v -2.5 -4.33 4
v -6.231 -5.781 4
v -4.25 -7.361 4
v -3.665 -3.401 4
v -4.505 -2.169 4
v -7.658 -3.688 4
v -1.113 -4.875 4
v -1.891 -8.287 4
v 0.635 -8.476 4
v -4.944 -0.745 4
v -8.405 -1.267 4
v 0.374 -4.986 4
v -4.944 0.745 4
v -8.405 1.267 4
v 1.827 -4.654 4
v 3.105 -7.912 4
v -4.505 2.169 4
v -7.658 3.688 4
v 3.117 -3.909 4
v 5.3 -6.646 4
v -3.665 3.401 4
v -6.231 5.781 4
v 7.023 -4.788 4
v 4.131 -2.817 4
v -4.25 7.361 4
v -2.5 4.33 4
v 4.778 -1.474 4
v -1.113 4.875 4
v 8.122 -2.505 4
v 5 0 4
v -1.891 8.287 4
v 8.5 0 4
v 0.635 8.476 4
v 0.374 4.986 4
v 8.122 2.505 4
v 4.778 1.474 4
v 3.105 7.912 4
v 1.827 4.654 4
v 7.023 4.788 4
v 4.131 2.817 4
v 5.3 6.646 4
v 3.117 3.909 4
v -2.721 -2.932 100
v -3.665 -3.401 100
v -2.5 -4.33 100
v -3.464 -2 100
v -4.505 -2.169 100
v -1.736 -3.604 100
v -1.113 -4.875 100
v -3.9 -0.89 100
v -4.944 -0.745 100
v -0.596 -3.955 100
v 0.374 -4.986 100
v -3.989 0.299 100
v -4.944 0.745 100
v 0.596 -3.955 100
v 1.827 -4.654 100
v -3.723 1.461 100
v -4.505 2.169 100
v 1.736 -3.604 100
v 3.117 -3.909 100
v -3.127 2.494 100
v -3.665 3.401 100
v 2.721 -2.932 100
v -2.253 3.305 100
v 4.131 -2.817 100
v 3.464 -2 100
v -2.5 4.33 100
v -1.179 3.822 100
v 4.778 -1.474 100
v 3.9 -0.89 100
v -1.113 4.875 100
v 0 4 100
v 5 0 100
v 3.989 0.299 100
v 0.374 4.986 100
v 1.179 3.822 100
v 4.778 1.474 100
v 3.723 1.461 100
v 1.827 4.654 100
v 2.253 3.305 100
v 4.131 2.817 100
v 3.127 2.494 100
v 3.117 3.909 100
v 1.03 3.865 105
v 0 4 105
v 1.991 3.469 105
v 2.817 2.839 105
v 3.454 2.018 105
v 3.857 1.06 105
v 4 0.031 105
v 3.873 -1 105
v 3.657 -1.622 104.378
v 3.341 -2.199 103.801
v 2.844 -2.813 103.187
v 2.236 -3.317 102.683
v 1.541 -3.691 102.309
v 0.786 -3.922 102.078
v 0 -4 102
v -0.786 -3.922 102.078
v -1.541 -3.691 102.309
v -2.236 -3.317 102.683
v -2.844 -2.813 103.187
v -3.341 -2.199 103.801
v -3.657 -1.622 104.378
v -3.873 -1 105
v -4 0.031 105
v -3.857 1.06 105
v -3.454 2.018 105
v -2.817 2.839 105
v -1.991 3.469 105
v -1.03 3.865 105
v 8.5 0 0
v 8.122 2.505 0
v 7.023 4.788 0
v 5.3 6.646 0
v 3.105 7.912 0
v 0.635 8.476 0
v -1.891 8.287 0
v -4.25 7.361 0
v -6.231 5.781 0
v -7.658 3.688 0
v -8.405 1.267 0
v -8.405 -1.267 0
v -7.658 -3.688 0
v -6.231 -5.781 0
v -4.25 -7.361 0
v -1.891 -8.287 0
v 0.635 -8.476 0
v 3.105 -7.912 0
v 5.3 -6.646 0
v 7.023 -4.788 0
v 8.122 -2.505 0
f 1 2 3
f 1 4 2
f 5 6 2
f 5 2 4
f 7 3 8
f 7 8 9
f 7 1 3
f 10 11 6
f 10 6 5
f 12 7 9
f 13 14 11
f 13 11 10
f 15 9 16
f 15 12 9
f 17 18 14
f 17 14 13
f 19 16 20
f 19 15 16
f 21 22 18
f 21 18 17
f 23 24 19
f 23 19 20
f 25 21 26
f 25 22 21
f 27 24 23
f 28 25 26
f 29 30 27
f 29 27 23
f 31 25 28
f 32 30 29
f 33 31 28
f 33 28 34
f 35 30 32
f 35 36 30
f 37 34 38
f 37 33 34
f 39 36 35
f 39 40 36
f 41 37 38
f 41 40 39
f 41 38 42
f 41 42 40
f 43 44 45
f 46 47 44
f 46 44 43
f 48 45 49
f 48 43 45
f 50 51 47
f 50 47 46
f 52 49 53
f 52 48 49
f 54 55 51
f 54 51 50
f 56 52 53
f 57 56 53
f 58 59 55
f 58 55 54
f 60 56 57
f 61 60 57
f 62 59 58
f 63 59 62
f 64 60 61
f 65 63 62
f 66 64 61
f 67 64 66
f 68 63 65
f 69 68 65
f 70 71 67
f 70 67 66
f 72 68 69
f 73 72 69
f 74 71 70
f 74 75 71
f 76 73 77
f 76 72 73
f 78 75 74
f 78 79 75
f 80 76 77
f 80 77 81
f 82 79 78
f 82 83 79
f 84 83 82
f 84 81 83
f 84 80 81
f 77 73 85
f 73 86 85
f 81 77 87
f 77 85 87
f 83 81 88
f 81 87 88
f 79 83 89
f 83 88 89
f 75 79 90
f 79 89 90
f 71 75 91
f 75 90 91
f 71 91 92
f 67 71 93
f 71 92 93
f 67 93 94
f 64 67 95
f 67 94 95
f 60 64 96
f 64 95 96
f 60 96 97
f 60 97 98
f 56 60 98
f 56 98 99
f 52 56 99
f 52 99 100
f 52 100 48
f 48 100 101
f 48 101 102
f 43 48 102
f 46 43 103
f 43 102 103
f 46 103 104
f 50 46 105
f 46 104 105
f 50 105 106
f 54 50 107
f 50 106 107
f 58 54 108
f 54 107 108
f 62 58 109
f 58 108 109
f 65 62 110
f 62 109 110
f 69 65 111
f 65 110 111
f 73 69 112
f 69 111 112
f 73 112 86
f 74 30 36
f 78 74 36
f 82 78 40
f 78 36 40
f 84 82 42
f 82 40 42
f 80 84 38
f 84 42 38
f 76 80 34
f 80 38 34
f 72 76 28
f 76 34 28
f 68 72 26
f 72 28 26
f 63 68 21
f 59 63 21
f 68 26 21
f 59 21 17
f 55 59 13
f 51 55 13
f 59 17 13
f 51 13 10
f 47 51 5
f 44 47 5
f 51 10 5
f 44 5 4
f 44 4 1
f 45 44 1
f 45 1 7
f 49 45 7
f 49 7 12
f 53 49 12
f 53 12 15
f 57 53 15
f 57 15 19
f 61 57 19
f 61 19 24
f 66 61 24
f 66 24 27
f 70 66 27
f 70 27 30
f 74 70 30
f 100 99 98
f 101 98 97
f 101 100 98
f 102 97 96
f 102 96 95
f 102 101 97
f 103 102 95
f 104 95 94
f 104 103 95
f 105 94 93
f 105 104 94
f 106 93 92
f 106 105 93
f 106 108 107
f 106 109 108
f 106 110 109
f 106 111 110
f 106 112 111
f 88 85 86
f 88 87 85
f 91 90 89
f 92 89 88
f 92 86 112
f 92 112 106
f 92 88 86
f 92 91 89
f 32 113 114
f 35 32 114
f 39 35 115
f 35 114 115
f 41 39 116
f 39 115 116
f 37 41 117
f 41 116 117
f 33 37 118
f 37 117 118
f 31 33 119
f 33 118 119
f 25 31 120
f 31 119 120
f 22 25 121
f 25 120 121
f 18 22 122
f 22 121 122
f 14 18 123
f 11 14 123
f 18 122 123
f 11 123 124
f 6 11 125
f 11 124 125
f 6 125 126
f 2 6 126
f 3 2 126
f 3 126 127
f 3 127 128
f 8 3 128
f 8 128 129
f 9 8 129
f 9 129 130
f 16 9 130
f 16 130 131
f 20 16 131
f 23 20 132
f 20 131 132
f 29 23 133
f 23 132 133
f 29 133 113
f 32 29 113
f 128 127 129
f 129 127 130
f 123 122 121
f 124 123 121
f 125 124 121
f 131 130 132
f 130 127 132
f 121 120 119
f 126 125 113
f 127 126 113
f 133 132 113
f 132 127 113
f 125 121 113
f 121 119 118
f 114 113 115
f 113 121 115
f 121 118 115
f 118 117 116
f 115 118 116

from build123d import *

# Parameters (mm, degrees)
F0_R          = 8.5
F1_DEPTH      = 4
F3_R          = 5
F4_DEPTH      = 100
F5_W          = 4
F5_H          = 5
F9_DEPTH      = 8.501
F9_DEPTH_BACK = 25


with BuildPart() as f1:
    # F0 (on Top) → F1 (new body)
    with BuildSketch(Plane.XY):
        Circle(F0_R)
    extrude(amount=F1_DEPTH)

    # F3 (on Top) → F4 (join)
    with BuildSketch(Plane.XY):
        Circle(F3_R)
    extrude(amount=F4_DEPTH)

    # F5 (on Right) → F6 (revolve)
    with BuildSketch(Plane.YZ):
        with Locations((2, 102.5)):
            Rectangle(F5_W, F5_H)
    revolve(axis=Axis((0, 0, 102.5), (0, 0, -1)))

    # F8 (on Right) → F9 (cut, two sides)
    with BuildSketch(Plane.YZ) as f9_sk:
        Polygon((0, 106), (-5, 106), (-5, 101), align=None)
    extrude(amount=-F9_DEPTH, mode=Mode.SUBTRACT)
    extrude(f9_sk.sketch, amount=F9_DEPTH_BACK, mode=Mode.SUBTRACT)


solid = f1.part
